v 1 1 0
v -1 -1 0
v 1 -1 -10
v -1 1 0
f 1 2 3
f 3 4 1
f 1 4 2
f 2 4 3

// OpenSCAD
hull()polyhedron([[1,1,0],[-1,1,0],[-1,-1,0],[1,-1,-10]],[[0,1,2,3]]);
